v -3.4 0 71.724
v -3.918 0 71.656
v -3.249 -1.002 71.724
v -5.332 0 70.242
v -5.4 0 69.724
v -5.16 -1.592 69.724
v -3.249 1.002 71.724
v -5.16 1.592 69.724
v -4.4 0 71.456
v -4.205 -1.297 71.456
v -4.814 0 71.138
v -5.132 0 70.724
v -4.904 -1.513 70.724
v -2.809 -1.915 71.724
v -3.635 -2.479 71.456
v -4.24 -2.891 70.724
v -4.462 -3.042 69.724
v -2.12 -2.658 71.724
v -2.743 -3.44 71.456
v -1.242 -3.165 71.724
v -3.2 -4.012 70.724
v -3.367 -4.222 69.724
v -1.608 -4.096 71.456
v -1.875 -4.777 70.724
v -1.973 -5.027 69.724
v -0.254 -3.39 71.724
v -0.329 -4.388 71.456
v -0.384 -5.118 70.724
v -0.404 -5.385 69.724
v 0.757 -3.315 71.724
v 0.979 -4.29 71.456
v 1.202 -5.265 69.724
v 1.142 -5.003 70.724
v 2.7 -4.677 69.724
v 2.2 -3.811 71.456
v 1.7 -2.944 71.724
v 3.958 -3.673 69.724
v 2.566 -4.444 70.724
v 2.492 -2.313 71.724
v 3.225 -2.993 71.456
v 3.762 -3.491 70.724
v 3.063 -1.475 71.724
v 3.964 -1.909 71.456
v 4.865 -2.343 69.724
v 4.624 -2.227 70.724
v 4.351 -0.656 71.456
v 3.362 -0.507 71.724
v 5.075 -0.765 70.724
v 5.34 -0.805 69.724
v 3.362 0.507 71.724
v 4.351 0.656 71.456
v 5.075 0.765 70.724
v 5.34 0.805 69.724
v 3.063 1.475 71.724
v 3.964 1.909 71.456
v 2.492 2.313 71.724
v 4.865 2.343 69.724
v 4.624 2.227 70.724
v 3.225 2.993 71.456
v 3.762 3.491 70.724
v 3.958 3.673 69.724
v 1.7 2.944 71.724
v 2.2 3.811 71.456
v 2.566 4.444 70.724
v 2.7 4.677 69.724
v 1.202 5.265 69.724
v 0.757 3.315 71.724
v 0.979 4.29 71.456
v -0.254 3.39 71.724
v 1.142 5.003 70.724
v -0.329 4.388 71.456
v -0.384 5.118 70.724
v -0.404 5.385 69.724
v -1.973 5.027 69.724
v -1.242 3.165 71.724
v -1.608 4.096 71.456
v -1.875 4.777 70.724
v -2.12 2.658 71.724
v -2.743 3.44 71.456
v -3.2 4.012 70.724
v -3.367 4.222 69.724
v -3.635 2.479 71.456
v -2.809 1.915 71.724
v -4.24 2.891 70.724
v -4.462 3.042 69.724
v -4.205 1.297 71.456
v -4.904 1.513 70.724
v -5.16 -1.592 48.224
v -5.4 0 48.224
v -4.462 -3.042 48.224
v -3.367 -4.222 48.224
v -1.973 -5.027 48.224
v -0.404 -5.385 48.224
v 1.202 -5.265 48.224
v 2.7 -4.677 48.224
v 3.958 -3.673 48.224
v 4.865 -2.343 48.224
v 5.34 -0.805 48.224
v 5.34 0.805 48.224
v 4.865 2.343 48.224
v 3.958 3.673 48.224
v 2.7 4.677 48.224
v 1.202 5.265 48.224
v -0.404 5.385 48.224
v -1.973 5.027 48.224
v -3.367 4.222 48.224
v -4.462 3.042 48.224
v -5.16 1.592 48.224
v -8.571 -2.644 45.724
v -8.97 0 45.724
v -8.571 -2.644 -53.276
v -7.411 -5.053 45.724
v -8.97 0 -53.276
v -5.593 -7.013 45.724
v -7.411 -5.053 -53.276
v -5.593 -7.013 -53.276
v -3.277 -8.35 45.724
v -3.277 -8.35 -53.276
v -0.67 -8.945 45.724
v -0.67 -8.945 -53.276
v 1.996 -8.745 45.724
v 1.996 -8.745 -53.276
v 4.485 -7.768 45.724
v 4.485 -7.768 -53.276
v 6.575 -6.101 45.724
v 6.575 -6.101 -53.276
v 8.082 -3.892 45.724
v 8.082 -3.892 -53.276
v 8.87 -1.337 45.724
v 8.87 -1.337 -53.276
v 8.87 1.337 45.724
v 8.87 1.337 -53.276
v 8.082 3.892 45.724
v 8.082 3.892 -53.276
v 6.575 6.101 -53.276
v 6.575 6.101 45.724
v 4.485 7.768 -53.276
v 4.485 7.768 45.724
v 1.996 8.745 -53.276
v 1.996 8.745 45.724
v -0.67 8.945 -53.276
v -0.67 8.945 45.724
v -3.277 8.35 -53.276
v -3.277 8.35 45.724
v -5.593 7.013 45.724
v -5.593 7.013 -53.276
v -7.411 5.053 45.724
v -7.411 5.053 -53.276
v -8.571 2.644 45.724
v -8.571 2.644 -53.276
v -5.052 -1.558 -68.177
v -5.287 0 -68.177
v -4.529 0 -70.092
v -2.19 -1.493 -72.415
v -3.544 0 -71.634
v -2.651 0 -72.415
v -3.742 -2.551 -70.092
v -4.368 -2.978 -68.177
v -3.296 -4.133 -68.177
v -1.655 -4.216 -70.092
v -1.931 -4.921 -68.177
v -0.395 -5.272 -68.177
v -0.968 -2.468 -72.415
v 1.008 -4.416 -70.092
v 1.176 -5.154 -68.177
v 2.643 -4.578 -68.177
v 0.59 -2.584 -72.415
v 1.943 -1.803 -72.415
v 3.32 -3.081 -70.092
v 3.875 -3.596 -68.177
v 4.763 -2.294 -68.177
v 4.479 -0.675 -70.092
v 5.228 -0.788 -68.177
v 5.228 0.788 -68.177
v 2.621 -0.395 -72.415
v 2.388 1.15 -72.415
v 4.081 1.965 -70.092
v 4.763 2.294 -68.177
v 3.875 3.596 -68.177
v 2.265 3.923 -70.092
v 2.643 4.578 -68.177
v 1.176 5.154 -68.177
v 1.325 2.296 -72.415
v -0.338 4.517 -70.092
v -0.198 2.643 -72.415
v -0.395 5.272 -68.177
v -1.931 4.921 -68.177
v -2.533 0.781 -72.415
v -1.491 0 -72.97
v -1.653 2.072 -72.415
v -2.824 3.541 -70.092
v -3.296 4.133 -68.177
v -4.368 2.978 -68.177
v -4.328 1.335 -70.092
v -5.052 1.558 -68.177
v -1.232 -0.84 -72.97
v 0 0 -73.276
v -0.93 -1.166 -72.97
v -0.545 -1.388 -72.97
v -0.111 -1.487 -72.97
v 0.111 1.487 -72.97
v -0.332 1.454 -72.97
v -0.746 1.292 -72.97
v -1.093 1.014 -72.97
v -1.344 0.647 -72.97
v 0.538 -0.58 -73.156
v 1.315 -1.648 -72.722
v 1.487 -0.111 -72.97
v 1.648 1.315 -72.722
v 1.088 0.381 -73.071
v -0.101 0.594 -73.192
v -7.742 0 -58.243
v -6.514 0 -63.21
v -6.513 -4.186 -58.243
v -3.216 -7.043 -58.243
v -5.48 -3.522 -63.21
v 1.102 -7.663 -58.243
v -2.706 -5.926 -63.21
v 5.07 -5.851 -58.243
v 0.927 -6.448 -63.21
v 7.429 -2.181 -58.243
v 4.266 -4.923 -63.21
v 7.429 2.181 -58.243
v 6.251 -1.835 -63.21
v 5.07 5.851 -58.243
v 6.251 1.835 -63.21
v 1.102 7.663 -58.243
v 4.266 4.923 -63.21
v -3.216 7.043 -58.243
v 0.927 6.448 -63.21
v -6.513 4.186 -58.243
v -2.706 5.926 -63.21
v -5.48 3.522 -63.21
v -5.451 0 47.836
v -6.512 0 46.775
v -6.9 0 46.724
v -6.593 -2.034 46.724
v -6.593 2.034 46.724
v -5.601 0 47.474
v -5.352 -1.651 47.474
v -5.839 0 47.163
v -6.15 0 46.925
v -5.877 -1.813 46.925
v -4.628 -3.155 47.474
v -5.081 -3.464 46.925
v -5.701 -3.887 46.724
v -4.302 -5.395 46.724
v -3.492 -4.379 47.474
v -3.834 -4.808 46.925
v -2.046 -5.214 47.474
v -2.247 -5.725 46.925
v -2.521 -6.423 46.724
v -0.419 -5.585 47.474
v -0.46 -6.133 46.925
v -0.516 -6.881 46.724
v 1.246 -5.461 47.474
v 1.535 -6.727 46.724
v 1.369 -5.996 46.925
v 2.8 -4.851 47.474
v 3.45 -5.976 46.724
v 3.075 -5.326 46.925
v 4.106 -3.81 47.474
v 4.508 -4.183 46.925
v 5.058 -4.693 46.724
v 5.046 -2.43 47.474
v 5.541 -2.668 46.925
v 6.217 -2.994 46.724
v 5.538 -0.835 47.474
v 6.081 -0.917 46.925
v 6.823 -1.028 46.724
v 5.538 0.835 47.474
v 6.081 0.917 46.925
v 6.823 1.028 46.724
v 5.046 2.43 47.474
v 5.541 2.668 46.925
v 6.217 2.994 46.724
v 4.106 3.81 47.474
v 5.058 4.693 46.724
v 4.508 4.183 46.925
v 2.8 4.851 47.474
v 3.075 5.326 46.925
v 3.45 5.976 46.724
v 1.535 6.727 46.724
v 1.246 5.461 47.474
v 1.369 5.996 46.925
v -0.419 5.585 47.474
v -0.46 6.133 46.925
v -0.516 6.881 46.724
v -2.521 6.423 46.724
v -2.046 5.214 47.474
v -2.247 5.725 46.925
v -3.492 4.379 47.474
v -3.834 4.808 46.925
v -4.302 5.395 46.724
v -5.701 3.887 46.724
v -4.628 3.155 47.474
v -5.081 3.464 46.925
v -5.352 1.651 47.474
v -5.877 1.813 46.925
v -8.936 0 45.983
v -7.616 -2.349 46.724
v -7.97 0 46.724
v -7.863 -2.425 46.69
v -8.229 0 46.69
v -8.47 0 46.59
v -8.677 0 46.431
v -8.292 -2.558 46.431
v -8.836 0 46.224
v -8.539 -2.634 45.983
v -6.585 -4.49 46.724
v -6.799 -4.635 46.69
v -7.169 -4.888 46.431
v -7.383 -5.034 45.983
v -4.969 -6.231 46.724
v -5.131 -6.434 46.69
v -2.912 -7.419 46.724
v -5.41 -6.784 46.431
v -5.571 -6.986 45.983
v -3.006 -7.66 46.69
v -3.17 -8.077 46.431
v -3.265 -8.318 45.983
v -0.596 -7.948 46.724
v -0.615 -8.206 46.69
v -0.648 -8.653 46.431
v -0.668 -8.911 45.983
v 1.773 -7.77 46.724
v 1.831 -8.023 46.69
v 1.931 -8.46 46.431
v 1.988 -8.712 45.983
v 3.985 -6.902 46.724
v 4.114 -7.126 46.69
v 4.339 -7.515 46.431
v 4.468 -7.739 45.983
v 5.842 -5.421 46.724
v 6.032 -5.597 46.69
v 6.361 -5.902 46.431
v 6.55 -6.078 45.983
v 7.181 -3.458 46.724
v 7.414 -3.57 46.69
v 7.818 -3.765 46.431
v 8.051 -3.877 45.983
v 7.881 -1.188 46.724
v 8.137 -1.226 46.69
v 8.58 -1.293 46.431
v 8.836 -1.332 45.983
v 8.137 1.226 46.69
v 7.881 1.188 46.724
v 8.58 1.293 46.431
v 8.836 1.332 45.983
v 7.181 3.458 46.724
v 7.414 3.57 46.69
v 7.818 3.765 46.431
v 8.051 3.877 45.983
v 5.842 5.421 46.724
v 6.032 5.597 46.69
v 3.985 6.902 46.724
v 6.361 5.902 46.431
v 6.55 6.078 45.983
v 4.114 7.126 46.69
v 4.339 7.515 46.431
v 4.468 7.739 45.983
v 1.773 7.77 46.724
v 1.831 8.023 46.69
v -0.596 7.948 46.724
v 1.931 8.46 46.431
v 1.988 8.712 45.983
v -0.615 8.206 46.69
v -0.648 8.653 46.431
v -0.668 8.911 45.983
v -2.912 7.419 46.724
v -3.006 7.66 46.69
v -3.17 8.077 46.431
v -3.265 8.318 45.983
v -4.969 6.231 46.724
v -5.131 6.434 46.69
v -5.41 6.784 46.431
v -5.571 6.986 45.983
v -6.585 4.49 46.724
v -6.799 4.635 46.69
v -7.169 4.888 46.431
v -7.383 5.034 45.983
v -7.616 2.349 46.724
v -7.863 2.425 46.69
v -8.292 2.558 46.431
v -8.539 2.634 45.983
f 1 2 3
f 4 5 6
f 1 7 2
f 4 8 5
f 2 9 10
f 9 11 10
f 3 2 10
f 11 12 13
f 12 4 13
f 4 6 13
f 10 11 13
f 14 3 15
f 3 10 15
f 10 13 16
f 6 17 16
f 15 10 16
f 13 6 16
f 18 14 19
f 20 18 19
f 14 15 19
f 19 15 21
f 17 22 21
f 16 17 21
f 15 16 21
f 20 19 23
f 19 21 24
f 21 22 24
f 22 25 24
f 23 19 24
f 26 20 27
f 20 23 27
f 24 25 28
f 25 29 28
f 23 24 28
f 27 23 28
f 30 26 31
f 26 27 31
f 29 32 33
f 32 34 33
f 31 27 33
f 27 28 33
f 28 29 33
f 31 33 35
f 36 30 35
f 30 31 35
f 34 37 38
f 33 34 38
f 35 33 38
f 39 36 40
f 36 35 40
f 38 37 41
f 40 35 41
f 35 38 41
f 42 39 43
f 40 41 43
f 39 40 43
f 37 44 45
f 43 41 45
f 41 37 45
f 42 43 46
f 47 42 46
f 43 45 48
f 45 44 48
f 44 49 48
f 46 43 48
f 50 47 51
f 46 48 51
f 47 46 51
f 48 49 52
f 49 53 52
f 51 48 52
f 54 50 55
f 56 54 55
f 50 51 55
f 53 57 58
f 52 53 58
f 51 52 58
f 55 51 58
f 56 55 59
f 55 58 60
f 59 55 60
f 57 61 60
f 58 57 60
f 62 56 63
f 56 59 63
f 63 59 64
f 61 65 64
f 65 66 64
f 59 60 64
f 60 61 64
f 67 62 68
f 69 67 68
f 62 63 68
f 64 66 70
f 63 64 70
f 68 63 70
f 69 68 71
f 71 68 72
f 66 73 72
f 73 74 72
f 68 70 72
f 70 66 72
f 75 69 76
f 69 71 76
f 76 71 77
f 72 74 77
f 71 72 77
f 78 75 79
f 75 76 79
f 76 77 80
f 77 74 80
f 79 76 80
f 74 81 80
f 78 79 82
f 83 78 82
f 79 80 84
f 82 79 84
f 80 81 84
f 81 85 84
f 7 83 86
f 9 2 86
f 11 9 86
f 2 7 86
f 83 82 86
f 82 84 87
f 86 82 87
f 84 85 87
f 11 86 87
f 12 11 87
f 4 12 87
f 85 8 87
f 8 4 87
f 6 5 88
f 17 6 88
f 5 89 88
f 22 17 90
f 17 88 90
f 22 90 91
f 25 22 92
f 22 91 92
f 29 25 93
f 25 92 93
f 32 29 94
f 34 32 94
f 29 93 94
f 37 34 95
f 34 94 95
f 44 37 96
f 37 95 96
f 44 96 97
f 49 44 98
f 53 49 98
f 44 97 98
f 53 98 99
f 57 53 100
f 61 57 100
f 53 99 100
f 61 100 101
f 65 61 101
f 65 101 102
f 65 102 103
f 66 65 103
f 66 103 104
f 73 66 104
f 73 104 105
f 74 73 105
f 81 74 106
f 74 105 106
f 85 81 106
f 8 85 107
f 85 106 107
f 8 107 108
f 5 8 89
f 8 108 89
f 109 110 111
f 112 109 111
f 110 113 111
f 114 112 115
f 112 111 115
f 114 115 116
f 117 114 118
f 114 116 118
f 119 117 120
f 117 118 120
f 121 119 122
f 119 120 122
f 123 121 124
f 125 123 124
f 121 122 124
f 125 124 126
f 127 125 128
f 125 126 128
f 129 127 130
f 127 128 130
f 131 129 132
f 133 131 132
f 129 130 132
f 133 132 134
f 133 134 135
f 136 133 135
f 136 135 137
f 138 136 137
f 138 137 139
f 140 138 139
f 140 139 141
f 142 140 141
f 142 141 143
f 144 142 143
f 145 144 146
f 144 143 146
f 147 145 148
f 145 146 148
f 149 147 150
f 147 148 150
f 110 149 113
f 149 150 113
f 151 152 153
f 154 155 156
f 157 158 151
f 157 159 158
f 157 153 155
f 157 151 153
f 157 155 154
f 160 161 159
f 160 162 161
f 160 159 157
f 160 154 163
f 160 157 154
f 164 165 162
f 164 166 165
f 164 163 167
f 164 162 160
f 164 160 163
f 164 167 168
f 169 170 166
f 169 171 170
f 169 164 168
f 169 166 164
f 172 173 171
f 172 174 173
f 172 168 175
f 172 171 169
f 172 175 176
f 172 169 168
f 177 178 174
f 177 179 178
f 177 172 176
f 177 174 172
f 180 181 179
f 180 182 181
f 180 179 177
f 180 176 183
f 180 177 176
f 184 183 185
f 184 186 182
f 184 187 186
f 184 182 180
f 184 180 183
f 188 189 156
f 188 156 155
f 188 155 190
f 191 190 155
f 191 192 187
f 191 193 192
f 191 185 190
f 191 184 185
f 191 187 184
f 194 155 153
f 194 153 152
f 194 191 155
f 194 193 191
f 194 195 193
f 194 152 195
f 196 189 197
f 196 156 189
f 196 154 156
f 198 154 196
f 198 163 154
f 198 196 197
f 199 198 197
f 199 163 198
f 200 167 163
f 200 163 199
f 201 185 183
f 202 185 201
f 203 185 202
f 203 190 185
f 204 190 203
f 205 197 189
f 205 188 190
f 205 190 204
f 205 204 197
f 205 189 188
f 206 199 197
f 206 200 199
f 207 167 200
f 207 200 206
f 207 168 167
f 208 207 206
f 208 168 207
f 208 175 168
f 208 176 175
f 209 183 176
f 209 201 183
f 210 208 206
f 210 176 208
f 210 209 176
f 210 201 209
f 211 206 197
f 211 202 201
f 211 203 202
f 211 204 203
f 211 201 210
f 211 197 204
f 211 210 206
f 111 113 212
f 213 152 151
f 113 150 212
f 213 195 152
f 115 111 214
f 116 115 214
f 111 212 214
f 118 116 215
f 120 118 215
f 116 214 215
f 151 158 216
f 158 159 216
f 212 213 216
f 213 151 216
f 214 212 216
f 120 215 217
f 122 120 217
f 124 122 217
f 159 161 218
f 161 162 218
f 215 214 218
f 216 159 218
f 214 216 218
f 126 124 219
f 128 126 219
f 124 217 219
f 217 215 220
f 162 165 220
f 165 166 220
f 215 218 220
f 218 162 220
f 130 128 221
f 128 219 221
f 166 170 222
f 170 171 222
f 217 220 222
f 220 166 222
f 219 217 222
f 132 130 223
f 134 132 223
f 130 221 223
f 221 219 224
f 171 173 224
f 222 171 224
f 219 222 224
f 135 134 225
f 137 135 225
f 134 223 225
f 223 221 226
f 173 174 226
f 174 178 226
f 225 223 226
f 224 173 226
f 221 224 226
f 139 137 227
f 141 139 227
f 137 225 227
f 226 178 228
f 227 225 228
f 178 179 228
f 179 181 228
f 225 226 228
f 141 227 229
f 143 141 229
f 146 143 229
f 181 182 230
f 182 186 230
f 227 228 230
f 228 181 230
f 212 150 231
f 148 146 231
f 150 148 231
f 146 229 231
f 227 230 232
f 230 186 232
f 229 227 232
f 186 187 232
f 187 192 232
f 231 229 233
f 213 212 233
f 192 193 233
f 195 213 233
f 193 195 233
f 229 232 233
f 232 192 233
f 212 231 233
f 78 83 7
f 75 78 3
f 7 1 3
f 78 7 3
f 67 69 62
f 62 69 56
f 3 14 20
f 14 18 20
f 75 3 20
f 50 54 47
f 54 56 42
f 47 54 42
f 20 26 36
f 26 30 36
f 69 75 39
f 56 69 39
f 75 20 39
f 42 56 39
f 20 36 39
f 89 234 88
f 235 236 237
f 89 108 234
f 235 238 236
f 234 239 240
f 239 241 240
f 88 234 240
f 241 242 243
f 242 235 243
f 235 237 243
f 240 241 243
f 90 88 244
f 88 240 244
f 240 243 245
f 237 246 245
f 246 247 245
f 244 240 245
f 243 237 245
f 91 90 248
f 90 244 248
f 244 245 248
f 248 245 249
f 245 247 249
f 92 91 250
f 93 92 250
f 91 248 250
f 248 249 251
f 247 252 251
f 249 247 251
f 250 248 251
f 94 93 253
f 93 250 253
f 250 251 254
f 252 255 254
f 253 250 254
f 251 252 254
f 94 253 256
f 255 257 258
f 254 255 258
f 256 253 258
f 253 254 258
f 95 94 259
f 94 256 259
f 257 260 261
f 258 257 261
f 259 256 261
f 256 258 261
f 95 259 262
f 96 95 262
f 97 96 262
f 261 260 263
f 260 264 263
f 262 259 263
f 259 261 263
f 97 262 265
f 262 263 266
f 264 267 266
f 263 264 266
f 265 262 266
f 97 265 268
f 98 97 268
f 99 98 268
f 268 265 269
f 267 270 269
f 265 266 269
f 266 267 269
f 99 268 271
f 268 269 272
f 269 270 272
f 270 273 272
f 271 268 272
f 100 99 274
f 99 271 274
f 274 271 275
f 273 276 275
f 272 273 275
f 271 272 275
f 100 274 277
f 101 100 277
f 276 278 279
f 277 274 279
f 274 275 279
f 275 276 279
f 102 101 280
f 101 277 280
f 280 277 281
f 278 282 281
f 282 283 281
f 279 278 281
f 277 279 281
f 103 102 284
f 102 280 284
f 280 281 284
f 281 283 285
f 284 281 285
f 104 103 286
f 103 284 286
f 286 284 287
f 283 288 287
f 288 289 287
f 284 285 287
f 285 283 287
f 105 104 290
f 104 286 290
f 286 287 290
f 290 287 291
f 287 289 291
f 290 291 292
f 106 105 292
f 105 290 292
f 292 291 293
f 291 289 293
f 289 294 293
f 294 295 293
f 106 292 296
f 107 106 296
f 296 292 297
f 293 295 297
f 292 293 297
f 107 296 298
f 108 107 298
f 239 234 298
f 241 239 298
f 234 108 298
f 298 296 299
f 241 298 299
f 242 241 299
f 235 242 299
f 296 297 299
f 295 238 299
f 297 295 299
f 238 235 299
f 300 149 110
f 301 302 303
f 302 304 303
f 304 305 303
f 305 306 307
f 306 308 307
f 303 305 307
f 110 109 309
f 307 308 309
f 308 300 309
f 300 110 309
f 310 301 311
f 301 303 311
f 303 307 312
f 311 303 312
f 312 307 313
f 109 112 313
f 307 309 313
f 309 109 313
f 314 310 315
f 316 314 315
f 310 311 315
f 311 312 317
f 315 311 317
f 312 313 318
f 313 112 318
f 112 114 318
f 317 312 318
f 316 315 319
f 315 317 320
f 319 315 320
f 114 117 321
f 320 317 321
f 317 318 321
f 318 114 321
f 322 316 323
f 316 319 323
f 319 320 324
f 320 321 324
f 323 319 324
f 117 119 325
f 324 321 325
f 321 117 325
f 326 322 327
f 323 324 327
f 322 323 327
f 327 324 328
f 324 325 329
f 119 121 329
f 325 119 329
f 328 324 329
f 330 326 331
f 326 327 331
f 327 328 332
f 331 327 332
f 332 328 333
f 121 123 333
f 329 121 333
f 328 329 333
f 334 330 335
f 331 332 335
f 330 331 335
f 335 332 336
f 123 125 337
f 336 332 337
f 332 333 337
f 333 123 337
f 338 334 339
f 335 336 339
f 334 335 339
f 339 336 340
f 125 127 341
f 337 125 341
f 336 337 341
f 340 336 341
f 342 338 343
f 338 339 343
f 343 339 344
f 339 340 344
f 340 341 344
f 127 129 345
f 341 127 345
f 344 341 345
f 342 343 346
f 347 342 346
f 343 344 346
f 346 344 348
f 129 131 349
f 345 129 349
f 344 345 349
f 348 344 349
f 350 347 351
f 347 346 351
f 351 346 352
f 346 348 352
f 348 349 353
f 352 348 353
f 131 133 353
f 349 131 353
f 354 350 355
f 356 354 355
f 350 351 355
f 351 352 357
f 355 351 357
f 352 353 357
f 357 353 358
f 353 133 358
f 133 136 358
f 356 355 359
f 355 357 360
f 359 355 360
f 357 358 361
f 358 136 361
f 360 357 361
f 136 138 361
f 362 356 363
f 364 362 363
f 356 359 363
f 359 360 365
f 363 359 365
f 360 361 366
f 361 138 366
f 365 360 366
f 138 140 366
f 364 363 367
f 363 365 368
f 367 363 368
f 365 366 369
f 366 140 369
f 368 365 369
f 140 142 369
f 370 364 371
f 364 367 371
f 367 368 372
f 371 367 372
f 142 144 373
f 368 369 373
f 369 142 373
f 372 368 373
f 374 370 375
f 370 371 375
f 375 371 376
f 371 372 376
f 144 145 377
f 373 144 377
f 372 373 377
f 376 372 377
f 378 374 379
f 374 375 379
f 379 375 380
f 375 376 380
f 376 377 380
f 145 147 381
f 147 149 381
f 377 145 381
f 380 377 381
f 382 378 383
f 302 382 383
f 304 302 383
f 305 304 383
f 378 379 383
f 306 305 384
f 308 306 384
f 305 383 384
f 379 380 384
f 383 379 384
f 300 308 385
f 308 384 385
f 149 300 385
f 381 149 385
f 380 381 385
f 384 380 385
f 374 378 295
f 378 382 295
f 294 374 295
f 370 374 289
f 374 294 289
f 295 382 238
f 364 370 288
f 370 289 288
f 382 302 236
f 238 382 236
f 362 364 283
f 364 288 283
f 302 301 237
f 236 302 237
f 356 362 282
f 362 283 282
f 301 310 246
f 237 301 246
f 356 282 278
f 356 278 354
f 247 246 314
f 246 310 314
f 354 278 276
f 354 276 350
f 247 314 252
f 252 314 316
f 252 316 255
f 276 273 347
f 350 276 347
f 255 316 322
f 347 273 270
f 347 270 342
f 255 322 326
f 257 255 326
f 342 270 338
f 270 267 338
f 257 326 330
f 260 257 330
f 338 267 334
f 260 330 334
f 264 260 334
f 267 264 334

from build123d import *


with BuildPart() as f1:
    # F0 (on Front) → F1 (revolve)
    with BuildSketch(Plane.XZ):
        with BuildLine():
            Line((-8.97, -53.276034), (0, -53.276034))
            Line((0, -53.276034), (0, 46.723966))
            Line((0, 46.723966), (0, 71.723966))
            Line((0, 71.723966), (-3.4, 71.723966))
            ThreePointArc((-3.4, 71.723966), (-4.814214, 71.138179), (-5.4, 69.723966))
            Line((-5.4, 69.723966), (-5.4, 48.223966))
            ThreePointArc((-5.4, 48.223966), (-5.83934, 47.163306), (-6.9, 46.723966))
            Line((-6.9, 46.723966), (-7.97, 46.723966))
            ThreePointArc((-7.97, 46.723966), (-8.677107, 46.431073), (-8.97, 45.723966))
            Line((-8.97, 45.723966), (-8.97, -53.276034))
        make_face()
        with BuildLine():
            Line((0, -73.276034), (0, -53.276034))
            Line((0, -53.276034), (-8.97, -53.276034))
            Line((-8.97, -53.276034), (-5.286714, -68.176575))
            add(Edge.make_bspline(
                [(0, -73.276034), (-3.358694, -72.929113), (-4.330067, -70.94463), (-5.286714, -68.176575)],
                knots=[0, 0, 0, 0, 7.345327, 7.345327, 7.345327, 7.345327], degree=3))
        make_face()
    revolve(axis=Axis((0, 0, -3.276034), (0, 0, 1)))


solid = f1.part
